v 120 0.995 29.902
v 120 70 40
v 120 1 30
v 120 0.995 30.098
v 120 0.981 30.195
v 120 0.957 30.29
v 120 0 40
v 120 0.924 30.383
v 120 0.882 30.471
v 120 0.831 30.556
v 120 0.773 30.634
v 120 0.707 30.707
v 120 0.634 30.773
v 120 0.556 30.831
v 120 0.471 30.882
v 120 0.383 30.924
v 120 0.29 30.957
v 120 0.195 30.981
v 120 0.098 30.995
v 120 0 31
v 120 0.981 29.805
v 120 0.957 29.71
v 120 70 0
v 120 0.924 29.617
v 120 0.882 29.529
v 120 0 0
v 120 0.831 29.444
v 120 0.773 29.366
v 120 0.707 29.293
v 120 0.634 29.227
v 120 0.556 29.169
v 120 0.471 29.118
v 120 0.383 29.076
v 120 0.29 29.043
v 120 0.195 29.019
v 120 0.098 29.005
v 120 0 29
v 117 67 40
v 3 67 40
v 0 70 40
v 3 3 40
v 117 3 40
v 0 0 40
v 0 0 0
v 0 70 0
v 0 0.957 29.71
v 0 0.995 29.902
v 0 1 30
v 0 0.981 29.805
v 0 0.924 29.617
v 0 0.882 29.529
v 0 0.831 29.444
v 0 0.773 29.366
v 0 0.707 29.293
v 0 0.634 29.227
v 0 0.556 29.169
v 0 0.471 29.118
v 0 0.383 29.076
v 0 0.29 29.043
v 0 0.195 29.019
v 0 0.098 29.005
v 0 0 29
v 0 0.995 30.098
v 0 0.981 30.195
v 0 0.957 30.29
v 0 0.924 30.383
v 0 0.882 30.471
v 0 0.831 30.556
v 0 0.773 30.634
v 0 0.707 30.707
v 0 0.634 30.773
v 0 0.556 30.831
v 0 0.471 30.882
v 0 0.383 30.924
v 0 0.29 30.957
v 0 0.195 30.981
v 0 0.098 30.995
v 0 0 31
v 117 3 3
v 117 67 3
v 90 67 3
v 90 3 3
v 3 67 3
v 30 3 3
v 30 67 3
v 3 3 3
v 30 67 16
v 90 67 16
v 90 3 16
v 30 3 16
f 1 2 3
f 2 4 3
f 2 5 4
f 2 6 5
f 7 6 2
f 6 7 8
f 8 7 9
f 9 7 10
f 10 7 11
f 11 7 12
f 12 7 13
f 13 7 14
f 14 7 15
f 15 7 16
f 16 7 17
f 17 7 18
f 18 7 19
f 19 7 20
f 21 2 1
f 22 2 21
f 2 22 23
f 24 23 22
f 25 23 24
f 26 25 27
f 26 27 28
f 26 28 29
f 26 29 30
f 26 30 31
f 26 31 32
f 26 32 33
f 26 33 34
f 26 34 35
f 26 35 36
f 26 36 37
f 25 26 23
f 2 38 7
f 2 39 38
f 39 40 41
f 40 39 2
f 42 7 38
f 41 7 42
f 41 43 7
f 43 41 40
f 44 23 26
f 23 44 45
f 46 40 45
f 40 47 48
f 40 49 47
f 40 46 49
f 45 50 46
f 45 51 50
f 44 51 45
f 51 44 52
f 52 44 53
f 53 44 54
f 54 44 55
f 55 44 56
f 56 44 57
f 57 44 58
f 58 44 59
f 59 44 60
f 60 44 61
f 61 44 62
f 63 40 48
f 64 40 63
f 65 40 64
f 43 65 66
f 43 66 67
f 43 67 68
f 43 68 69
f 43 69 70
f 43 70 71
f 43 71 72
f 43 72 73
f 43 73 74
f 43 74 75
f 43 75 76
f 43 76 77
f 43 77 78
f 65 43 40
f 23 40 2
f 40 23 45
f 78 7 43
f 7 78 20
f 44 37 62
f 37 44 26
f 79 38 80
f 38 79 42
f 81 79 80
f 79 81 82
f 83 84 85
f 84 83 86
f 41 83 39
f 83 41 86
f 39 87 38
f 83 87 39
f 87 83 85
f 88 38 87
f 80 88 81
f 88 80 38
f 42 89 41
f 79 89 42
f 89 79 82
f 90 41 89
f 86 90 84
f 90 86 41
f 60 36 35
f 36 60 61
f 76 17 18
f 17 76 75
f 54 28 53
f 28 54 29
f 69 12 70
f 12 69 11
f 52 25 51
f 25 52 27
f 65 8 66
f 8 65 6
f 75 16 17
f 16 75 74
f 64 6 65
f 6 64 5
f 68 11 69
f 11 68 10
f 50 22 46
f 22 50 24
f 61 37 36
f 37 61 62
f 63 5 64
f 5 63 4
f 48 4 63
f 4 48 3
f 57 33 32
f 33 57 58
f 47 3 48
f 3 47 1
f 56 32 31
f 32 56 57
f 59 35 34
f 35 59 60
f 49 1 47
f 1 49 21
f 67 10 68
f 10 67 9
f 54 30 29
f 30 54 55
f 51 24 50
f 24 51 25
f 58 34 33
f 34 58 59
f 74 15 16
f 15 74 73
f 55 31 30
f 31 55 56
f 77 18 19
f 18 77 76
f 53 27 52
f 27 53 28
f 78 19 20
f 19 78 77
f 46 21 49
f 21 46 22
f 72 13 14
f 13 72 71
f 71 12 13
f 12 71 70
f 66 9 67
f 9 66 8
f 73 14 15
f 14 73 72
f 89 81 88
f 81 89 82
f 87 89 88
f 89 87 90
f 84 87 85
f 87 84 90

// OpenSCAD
// --- Parameters ---
// Outer dimensions of the tank
outer_x = 120; // Length of the tank (X)
outer_y = 70;  // Width of the tank (Y)
outer_z = 40;  // Height of the tank (Z)

// Wall and floor thickness
wall_thickness = 3; 
floor_thickness = 3;

// Platform dimensions
platform_length = 60; // Length of the platform along X
platform_height_from_inner_floor = 10; // Height of platform top relative to inner floor

// Electrode holes
hole_diameter = 2;
hole_y_pos = 0; // Y position of the hole center
hole_z_pos = 30; // Z position of the hole center

// Resolution
$fn = 64;

// --- Calculations ---
inner_x = outer_x - (2 * wall_thickness);
inner_y = outer_y - (2 * wall_thickness);
inner_z = outer_z - floor_thickness;

// The platform top is 10mm above the inner floor.
// Inner floor is at z = floor_thickness.
platform_top_z = floor_thickness + platform_height_from_inner_floor;

// --- Modeling ---

module buffer_tank() {
    difference() {
        // Main Body
        cube([outer_x, outer_y, outer_z]);

        // Hollow out the tank
        // We subtract the inner volume. 
        // To ensure the top is open, we subtract a cube that goes to the top.
        translate([wall_thickness, wall_thickness, floor_thickness])
            cube([inner_x, inner_y, outer_z]);

        // Electrode holes (drilled through the X-end walls)
        // The user specified holes at y = 0. 
        // Since the tank is centered on X and Y, the Y range is -35 to 35.
        // A hole at y=0 is in the middle of the Y-axis.
        // To ensure it cuts through both walls, we make it longer than the tank.
        translate([-1, hole_y_pos, hole_z_pos])
            rotate([0, 90, 0])
                cylinder(d = hole_diameter, h = outer_x + 2);
    }

    // The Platform
    // It spans the full inner width (Y) and is 60mm long (X), centered.
    // It sits on the floor.
    // Note: The platform is a solid part inside the tank.
    // It must be added to the main body.
    translate([
        (outer_x - platform_length) / 2, 
        wall_thickness, 
        floor_thickness
    ])
    cube([platform_length, inner_y, platform_top_z]);
}

// The previous report showed the platform was being subtracted or 
// incorrectly calculated. To ensure a single watertight solid, 
// we use union() to combine the shell and the platform.
union() {
    // The shell (walls + floor)
    difference() {
        cube([outer_x, outer_y, outer_z]);
        
        // Subtract the inner void
        translate([wall_thickness, wall_thickness, floor_thickness])
            cube([inner_x, inner_y, outer_z + 0.01]); // extend slightly to ensure open top
            
        // Subtract the electrode holes
        translate([-1, hole_y_pos, hole_z_pos])
            rotate([0, 90, 0])
                cylinder(d = hole_diameter, h = outer_x + 2);
    }

    // The Platform (Solid)
    translate([
        (outer_x - platform_length) / 2, 
        wall_thickness, 
        floor_thickness
    ])
    cube([platform_length, inner_y, platform_top_z]);
}
